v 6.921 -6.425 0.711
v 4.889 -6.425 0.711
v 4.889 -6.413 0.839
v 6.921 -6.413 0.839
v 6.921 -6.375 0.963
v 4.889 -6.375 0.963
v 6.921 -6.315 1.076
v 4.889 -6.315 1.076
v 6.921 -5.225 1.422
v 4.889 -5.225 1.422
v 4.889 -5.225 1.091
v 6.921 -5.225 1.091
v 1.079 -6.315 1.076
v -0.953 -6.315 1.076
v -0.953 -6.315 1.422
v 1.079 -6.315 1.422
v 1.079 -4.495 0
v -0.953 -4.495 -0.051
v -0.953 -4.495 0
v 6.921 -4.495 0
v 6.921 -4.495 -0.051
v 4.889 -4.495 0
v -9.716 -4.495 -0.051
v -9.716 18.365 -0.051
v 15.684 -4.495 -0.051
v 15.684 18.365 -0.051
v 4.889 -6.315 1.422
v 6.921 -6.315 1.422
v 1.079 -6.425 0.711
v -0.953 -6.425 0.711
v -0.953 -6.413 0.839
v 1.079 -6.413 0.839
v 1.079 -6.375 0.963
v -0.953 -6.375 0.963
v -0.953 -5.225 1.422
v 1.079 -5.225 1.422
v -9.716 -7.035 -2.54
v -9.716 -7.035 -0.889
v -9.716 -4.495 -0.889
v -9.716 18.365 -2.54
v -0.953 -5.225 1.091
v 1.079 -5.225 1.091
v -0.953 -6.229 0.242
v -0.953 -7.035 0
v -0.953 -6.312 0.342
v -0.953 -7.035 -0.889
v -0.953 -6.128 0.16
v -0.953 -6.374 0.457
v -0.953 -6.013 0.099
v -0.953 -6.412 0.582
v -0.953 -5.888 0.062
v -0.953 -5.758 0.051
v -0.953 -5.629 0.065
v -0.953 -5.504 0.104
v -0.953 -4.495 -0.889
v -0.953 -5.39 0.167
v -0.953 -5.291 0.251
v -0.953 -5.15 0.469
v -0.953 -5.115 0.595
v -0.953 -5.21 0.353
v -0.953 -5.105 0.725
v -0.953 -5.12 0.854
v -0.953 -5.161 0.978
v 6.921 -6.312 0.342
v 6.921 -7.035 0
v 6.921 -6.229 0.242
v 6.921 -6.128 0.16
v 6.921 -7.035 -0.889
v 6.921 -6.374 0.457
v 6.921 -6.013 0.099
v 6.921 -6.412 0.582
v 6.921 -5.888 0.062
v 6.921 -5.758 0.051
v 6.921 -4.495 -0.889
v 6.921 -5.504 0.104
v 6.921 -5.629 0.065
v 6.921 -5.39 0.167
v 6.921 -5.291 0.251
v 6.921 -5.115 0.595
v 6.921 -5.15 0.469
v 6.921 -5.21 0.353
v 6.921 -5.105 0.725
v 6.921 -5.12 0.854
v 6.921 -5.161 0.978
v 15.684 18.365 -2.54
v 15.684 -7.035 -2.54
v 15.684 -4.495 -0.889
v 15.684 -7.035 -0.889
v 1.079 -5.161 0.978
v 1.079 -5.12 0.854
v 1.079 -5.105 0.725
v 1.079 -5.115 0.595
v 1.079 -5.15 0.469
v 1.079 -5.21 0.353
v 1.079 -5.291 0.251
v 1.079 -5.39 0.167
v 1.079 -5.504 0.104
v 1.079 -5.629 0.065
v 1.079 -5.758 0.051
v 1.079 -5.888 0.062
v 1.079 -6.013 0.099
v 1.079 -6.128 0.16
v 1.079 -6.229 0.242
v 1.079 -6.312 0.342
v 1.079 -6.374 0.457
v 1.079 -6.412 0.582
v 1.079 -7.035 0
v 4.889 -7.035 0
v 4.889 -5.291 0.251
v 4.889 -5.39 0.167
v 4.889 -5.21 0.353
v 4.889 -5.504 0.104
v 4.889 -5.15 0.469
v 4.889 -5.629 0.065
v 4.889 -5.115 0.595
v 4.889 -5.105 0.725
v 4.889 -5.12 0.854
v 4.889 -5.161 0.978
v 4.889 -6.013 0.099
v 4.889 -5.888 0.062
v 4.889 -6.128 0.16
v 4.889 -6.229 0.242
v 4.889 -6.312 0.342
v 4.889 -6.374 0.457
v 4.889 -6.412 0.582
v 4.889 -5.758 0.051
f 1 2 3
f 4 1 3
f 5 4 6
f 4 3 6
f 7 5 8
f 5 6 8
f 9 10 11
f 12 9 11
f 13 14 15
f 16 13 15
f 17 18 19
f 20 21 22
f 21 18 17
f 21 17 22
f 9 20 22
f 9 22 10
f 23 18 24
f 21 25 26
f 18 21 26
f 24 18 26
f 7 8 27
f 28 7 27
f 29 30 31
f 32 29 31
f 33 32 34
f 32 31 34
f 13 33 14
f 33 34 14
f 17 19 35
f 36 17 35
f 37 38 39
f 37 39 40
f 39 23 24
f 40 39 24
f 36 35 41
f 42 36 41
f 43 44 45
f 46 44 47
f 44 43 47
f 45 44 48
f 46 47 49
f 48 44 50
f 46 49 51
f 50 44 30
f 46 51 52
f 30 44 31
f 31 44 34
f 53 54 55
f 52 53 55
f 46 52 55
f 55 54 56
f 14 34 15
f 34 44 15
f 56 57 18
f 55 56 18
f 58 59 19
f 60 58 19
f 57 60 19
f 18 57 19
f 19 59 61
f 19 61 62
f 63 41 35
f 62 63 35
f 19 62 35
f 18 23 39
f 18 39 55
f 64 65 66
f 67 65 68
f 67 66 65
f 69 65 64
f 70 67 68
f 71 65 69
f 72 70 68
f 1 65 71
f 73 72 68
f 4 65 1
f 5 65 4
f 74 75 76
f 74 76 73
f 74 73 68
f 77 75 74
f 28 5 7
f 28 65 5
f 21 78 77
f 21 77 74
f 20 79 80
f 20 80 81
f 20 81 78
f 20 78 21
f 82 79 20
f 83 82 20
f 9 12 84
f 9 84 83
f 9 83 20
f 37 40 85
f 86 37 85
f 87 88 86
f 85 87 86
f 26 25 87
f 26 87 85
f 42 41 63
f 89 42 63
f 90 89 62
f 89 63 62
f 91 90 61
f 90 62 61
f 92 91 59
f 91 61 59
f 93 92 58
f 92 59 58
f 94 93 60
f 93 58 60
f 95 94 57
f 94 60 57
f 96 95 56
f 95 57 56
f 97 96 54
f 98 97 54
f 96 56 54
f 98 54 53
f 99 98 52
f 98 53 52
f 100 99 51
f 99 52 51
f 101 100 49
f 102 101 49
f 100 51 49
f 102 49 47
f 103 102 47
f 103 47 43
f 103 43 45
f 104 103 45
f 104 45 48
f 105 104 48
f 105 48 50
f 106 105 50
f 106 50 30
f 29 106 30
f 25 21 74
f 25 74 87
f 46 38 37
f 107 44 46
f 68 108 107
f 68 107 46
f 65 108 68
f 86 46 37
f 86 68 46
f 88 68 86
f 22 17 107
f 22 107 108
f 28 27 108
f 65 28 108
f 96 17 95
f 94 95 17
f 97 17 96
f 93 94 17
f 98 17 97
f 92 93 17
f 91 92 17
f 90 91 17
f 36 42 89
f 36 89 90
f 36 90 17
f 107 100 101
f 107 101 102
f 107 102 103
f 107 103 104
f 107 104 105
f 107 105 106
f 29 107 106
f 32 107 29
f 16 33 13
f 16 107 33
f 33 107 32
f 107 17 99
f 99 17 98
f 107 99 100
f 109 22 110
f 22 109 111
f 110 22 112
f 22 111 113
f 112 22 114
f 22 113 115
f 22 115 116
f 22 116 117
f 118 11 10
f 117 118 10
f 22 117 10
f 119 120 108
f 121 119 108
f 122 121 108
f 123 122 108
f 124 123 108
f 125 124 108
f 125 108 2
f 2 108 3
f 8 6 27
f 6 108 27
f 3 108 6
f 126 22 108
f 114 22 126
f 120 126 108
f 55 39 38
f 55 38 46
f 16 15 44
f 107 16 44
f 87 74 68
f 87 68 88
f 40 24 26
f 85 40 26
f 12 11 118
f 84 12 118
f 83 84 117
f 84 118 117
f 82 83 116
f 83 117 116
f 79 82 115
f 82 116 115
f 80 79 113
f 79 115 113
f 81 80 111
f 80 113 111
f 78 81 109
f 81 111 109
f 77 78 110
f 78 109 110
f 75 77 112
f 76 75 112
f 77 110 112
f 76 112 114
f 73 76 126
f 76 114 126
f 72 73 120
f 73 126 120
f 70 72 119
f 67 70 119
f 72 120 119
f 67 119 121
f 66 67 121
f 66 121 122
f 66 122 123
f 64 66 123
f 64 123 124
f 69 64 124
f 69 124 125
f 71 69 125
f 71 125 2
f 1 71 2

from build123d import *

# Parameters (mm, degrees)
F0_W      = 25.4
F0_H      = 25.4
F1_DEPTH  = 2.54
F2_W      = 10.16
F2_H      = 2.54
F3_DEPTH  = 1.4224
F5_W      = 1.143
F5_H      = 1.4224
F5_W_2    = 3.81
F6_DEPTH  = 25.4
F7_DEPTH  = 25.4
F8_W      = 8.763
F8_H      = 2.54
F9_DEPTH  = 0.889
F10_W     = 22.86
F10_H     = 0.0508
F11_DEPTH = 25.4


with BuildPart() as f1:
    # F0 (on Top) → F1 (new body)
    with BuildSketch(Plane.XY):
        with Locations((2.984056, 5.665214)):
            Rectangle(F0_W, F0_H)
    extrude(amount=-F1_DEPTH)

    # F2 (on face) → F3 (join)
    with BuildSketch(Plane.XY):
        with Locations((2.984056, -5.764786)):
            Rectangle(F2_W, F2_H)
    extrude(amount=F3_DEPTH)

    # F5 (on face) → F6 (cut)
    with BuildSketch(Plane.XZ.offset(7.034786)):
        with Locations((-1.524444, 0.7112)):
            Rectangle(F5_W, F5_H)
        with Locations((2.984056, 0.7112)):
            Rectangle(F5_W_2, F5_H)
        with Locations((7.492556, 0.7112)):
            Rectangle(F5_W, F5_H)
    extrude(amount=-F6_DEPTH, mode=Mode.SUBTRACT)

    # F4 (on face) → F7 (cut)
    with BuildSketch(Plane(origin=(-2.095944, 0, 0), x_dir=(0, -1, 0), z_dir=(-1, 0, 0))):
        Polygon((4.494786, 0), (5.224647, 1.4224), (4.494786, 1.4224), align=None)
        with BuildLine():
            ThreePointArc((5.224647, 1.091172), (5.565511, 0.081583), (6.425186, 0.7112))
            ThreePointArc((6.425186, 0.7112), (6.39704, 0.901944), (6.315001, 1.076428))
            ThreePointArc((6.315001, 1.076428), (5.773715, 1.37154), (5.224647, 1.091172))
        make_face()
        with BuildLine():
            ThreePointArc((5.224647, 1.091172), (5.773715, 1.37154), (6.315001, 1.076428))
            Line((6.315001, 1.076428), (6.315001, 1.4224))
            Line((6.315001, 1.4224), (5.224647, 1.4224))
            Line((5.224647, 1.4224), (5.224647, 1.091172))
        make_face()
        Polygon((7.034786, 1.4224), (6.315001, 1.4224), (7.034786, 0), align=None)
    extrude(amount=-F7_DEPTH, mode=Mode.SUBTRACT)

    # F8 (on face) → F9 (cut)
    with BuildSketch(Plane.XY):
        with Locations((11.302556, -5.764786)):
            Rectangle(F8_W, F8_H)
        with Locations((-5.334444, -5.764786)):
            Rectangle(F8_W, F8_H)
    extrude(amount=-F9_DEPTH, mode=Mode.SUBTRACT)

    # F10 (on face) → F11 (cut)
    with BuildSketch(Plane.YZ.offset(15.684056)):
        with Locations((6.935214, -0.0254)):
            Rectangle(F10_W, F10_H)
    extrude(amount=-F11_DEPTH, mode=Mode.SUBTRACT)


solid = f1.part
